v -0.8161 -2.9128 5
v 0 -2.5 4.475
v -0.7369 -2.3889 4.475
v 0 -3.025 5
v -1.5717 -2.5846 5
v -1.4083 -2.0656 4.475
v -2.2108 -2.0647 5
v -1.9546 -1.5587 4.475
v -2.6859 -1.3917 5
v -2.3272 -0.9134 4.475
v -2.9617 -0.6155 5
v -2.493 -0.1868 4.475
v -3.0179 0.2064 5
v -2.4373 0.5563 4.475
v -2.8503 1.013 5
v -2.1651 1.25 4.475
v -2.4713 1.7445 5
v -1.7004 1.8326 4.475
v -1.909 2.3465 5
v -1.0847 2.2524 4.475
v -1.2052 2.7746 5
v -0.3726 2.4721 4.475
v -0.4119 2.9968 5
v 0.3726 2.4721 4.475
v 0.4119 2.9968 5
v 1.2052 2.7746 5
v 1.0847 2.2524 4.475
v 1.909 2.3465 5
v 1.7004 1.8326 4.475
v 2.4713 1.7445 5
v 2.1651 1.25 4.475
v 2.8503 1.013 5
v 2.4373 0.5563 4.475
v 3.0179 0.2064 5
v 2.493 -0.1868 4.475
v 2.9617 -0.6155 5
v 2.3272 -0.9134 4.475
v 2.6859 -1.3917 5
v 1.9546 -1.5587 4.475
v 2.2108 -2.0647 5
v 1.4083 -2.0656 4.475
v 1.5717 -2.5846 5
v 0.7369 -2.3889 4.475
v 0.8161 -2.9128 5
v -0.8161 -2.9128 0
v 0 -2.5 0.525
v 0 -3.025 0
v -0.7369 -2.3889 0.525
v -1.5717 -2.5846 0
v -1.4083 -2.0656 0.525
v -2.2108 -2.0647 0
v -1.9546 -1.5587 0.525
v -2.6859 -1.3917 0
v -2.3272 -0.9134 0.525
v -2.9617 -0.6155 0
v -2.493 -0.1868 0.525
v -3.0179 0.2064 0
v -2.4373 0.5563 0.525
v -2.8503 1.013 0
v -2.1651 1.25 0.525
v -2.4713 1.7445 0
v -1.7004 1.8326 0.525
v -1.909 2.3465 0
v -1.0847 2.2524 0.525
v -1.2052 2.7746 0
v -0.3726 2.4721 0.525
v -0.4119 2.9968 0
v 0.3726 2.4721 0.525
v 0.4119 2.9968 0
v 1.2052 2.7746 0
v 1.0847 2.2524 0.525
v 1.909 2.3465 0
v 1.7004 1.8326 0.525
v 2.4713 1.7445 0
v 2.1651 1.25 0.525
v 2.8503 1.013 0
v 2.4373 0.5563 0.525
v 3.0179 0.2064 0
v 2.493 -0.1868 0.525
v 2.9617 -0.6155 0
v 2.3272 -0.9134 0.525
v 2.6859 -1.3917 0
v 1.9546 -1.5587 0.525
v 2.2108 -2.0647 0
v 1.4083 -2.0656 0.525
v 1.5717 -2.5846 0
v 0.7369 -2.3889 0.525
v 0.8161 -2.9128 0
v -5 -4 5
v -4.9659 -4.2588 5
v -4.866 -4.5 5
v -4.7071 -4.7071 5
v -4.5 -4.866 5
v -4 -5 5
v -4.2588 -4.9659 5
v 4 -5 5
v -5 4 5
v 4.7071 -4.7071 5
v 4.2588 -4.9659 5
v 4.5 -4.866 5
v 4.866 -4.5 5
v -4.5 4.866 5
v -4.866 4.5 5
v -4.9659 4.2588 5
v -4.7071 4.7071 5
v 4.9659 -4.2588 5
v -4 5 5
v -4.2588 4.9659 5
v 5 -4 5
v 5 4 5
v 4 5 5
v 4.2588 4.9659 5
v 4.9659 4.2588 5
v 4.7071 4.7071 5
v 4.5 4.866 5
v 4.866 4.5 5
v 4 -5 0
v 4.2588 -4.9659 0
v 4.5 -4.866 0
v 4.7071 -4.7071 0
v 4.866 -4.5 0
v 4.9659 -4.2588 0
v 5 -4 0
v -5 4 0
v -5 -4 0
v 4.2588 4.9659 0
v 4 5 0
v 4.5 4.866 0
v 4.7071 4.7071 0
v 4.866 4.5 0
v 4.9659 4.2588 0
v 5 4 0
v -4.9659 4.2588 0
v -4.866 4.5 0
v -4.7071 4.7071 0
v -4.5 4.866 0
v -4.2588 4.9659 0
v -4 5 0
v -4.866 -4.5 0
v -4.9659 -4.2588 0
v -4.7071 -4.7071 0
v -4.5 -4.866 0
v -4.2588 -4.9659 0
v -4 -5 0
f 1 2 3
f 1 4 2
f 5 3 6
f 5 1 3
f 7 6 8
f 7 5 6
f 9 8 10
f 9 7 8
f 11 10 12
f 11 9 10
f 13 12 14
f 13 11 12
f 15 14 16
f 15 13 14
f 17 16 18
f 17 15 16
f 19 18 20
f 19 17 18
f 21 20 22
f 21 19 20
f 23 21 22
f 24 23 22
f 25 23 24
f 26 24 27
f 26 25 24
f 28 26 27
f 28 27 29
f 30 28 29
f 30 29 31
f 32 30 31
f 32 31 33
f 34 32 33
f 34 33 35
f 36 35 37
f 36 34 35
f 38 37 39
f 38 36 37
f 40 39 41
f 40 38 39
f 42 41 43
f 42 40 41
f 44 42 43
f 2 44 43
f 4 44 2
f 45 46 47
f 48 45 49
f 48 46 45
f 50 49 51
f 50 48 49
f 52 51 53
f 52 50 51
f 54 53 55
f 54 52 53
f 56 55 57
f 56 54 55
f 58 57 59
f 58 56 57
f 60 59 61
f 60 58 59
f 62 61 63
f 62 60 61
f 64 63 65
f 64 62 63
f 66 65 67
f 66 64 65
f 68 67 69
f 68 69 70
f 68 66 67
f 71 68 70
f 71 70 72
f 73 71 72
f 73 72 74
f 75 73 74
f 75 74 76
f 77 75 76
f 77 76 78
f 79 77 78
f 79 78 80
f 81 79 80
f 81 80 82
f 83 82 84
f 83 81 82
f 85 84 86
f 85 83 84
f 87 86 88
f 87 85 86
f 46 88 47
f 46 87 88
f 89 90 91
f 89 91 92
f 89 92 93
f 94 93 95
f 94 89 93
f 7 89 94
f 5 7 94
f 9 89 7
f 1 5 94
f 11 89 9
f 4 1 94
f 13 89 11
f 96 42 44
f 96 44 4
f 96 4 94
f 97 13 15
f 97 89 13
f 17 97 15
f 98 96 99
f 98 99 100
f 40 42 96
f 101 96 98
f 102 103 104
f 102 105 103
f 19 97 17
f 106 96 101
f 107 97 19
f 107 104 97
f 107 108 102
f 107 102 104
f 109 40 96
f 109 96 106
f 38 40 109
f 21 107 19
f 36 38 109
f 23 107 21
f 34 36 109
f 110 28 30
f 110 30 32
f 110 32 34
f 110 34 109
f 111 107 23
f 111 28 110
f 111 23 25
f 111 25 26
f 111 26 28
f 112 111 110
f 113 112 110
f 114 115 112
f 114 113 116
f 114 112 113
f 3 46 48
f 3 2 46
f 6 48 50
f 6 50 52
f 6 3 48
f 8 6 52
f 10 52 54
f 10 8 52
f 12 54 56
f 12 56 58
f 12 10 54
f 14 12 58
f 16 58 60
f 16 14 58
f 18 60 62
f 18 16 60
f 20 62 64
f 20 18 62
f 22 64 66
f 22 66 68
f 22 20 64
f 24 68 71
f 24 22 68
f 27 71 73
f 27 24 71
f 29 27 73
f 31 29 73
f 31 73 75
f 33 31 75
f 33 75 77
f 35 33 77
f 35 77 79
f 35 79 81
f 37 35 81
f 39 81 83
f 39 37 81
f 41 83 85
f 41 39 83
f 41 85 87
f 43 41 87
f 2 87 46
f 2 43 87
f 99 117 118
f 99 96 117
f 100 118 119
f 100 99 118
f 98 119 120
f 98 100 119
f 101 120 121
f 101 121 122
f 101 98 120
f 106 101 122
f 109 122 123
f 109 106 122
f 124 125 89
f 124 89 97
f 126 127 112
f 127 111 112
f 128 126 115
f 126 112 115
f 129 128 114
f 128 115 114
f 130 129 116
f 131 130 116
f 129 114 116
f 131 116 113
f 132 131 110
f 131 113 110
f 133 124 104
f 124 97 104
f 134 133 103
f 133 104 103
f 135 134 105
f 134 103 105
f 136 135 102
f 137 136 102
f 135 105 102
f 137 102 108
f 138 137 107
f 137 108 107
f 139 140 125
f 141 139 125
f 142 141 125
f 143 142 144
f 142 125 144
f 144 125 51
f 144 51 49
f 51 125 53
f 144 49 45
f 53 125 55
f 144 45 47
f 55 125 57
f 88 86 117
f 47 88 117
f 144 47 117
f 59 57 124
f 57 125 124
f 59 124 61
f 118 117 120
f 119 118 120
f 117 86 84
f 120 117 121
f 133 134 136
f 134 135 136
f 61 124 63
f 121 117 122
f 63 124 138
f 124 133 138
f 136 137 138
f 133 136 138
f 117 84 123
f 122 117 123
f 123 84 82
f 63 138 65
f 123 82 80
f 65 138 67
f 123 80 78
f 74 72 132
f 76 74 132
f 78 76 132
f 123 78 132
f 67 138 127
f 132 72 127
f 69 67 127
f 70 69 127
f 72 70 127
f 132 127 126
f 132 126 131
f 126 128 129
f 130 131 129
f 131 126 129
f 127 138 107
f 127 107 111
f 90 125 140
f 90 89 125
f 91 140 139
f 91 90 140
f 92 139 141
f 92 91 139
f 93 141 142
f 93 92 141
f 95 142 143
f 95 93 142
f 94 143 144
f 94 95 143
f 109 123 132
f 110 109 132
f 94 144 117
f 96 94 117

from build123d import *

# Parameters (mm, degrees)
SKETCH_1_W      = 10
SKETCH_1_H      = 10
EXTRUDE_1_DEPTH = 5
FILLET_1_R      = 1


with BuildPart() as part:
    # Эскиз1 → Бобышка-Вытянуть1 (new body)
    with BuildSketch(Plane.XY):
        Rectangle(SKETCH_1_W, SKETCH_1_H)
    extrude(amount=EXTRUDE_1_DEPTH)

    # Эскиз3 → Отверстие обработанное метчиком M61 (revolve, cut)
    with BuildSketch(Plane(origin=(0, 0, 5), x_dir=(0, -1, 0), z_dir=(1, 0, 0))):
        Polygon((0, 0), (0, 5), (3.025, 5), (2.5, 4.475), (2.5, 0.525), (3.025, 0), align=None)
    revolve(axis=Axis((0, 0, 11.35), (0, 0, -1)), mode=Mode.SUBTRACT)

    # Скругление1
    fillet_1_edges = [part.edges().sort_by_distance(p)[0] for p in [
        (5, -5, 2.5),
        (-5, -5, 2.5),
        (-5, 5, 2.5),
        (5, 5, 2.5),
    ]]
    fillet(fillet_1_edges, radius=FILLET_1_R)


solid = part.part
